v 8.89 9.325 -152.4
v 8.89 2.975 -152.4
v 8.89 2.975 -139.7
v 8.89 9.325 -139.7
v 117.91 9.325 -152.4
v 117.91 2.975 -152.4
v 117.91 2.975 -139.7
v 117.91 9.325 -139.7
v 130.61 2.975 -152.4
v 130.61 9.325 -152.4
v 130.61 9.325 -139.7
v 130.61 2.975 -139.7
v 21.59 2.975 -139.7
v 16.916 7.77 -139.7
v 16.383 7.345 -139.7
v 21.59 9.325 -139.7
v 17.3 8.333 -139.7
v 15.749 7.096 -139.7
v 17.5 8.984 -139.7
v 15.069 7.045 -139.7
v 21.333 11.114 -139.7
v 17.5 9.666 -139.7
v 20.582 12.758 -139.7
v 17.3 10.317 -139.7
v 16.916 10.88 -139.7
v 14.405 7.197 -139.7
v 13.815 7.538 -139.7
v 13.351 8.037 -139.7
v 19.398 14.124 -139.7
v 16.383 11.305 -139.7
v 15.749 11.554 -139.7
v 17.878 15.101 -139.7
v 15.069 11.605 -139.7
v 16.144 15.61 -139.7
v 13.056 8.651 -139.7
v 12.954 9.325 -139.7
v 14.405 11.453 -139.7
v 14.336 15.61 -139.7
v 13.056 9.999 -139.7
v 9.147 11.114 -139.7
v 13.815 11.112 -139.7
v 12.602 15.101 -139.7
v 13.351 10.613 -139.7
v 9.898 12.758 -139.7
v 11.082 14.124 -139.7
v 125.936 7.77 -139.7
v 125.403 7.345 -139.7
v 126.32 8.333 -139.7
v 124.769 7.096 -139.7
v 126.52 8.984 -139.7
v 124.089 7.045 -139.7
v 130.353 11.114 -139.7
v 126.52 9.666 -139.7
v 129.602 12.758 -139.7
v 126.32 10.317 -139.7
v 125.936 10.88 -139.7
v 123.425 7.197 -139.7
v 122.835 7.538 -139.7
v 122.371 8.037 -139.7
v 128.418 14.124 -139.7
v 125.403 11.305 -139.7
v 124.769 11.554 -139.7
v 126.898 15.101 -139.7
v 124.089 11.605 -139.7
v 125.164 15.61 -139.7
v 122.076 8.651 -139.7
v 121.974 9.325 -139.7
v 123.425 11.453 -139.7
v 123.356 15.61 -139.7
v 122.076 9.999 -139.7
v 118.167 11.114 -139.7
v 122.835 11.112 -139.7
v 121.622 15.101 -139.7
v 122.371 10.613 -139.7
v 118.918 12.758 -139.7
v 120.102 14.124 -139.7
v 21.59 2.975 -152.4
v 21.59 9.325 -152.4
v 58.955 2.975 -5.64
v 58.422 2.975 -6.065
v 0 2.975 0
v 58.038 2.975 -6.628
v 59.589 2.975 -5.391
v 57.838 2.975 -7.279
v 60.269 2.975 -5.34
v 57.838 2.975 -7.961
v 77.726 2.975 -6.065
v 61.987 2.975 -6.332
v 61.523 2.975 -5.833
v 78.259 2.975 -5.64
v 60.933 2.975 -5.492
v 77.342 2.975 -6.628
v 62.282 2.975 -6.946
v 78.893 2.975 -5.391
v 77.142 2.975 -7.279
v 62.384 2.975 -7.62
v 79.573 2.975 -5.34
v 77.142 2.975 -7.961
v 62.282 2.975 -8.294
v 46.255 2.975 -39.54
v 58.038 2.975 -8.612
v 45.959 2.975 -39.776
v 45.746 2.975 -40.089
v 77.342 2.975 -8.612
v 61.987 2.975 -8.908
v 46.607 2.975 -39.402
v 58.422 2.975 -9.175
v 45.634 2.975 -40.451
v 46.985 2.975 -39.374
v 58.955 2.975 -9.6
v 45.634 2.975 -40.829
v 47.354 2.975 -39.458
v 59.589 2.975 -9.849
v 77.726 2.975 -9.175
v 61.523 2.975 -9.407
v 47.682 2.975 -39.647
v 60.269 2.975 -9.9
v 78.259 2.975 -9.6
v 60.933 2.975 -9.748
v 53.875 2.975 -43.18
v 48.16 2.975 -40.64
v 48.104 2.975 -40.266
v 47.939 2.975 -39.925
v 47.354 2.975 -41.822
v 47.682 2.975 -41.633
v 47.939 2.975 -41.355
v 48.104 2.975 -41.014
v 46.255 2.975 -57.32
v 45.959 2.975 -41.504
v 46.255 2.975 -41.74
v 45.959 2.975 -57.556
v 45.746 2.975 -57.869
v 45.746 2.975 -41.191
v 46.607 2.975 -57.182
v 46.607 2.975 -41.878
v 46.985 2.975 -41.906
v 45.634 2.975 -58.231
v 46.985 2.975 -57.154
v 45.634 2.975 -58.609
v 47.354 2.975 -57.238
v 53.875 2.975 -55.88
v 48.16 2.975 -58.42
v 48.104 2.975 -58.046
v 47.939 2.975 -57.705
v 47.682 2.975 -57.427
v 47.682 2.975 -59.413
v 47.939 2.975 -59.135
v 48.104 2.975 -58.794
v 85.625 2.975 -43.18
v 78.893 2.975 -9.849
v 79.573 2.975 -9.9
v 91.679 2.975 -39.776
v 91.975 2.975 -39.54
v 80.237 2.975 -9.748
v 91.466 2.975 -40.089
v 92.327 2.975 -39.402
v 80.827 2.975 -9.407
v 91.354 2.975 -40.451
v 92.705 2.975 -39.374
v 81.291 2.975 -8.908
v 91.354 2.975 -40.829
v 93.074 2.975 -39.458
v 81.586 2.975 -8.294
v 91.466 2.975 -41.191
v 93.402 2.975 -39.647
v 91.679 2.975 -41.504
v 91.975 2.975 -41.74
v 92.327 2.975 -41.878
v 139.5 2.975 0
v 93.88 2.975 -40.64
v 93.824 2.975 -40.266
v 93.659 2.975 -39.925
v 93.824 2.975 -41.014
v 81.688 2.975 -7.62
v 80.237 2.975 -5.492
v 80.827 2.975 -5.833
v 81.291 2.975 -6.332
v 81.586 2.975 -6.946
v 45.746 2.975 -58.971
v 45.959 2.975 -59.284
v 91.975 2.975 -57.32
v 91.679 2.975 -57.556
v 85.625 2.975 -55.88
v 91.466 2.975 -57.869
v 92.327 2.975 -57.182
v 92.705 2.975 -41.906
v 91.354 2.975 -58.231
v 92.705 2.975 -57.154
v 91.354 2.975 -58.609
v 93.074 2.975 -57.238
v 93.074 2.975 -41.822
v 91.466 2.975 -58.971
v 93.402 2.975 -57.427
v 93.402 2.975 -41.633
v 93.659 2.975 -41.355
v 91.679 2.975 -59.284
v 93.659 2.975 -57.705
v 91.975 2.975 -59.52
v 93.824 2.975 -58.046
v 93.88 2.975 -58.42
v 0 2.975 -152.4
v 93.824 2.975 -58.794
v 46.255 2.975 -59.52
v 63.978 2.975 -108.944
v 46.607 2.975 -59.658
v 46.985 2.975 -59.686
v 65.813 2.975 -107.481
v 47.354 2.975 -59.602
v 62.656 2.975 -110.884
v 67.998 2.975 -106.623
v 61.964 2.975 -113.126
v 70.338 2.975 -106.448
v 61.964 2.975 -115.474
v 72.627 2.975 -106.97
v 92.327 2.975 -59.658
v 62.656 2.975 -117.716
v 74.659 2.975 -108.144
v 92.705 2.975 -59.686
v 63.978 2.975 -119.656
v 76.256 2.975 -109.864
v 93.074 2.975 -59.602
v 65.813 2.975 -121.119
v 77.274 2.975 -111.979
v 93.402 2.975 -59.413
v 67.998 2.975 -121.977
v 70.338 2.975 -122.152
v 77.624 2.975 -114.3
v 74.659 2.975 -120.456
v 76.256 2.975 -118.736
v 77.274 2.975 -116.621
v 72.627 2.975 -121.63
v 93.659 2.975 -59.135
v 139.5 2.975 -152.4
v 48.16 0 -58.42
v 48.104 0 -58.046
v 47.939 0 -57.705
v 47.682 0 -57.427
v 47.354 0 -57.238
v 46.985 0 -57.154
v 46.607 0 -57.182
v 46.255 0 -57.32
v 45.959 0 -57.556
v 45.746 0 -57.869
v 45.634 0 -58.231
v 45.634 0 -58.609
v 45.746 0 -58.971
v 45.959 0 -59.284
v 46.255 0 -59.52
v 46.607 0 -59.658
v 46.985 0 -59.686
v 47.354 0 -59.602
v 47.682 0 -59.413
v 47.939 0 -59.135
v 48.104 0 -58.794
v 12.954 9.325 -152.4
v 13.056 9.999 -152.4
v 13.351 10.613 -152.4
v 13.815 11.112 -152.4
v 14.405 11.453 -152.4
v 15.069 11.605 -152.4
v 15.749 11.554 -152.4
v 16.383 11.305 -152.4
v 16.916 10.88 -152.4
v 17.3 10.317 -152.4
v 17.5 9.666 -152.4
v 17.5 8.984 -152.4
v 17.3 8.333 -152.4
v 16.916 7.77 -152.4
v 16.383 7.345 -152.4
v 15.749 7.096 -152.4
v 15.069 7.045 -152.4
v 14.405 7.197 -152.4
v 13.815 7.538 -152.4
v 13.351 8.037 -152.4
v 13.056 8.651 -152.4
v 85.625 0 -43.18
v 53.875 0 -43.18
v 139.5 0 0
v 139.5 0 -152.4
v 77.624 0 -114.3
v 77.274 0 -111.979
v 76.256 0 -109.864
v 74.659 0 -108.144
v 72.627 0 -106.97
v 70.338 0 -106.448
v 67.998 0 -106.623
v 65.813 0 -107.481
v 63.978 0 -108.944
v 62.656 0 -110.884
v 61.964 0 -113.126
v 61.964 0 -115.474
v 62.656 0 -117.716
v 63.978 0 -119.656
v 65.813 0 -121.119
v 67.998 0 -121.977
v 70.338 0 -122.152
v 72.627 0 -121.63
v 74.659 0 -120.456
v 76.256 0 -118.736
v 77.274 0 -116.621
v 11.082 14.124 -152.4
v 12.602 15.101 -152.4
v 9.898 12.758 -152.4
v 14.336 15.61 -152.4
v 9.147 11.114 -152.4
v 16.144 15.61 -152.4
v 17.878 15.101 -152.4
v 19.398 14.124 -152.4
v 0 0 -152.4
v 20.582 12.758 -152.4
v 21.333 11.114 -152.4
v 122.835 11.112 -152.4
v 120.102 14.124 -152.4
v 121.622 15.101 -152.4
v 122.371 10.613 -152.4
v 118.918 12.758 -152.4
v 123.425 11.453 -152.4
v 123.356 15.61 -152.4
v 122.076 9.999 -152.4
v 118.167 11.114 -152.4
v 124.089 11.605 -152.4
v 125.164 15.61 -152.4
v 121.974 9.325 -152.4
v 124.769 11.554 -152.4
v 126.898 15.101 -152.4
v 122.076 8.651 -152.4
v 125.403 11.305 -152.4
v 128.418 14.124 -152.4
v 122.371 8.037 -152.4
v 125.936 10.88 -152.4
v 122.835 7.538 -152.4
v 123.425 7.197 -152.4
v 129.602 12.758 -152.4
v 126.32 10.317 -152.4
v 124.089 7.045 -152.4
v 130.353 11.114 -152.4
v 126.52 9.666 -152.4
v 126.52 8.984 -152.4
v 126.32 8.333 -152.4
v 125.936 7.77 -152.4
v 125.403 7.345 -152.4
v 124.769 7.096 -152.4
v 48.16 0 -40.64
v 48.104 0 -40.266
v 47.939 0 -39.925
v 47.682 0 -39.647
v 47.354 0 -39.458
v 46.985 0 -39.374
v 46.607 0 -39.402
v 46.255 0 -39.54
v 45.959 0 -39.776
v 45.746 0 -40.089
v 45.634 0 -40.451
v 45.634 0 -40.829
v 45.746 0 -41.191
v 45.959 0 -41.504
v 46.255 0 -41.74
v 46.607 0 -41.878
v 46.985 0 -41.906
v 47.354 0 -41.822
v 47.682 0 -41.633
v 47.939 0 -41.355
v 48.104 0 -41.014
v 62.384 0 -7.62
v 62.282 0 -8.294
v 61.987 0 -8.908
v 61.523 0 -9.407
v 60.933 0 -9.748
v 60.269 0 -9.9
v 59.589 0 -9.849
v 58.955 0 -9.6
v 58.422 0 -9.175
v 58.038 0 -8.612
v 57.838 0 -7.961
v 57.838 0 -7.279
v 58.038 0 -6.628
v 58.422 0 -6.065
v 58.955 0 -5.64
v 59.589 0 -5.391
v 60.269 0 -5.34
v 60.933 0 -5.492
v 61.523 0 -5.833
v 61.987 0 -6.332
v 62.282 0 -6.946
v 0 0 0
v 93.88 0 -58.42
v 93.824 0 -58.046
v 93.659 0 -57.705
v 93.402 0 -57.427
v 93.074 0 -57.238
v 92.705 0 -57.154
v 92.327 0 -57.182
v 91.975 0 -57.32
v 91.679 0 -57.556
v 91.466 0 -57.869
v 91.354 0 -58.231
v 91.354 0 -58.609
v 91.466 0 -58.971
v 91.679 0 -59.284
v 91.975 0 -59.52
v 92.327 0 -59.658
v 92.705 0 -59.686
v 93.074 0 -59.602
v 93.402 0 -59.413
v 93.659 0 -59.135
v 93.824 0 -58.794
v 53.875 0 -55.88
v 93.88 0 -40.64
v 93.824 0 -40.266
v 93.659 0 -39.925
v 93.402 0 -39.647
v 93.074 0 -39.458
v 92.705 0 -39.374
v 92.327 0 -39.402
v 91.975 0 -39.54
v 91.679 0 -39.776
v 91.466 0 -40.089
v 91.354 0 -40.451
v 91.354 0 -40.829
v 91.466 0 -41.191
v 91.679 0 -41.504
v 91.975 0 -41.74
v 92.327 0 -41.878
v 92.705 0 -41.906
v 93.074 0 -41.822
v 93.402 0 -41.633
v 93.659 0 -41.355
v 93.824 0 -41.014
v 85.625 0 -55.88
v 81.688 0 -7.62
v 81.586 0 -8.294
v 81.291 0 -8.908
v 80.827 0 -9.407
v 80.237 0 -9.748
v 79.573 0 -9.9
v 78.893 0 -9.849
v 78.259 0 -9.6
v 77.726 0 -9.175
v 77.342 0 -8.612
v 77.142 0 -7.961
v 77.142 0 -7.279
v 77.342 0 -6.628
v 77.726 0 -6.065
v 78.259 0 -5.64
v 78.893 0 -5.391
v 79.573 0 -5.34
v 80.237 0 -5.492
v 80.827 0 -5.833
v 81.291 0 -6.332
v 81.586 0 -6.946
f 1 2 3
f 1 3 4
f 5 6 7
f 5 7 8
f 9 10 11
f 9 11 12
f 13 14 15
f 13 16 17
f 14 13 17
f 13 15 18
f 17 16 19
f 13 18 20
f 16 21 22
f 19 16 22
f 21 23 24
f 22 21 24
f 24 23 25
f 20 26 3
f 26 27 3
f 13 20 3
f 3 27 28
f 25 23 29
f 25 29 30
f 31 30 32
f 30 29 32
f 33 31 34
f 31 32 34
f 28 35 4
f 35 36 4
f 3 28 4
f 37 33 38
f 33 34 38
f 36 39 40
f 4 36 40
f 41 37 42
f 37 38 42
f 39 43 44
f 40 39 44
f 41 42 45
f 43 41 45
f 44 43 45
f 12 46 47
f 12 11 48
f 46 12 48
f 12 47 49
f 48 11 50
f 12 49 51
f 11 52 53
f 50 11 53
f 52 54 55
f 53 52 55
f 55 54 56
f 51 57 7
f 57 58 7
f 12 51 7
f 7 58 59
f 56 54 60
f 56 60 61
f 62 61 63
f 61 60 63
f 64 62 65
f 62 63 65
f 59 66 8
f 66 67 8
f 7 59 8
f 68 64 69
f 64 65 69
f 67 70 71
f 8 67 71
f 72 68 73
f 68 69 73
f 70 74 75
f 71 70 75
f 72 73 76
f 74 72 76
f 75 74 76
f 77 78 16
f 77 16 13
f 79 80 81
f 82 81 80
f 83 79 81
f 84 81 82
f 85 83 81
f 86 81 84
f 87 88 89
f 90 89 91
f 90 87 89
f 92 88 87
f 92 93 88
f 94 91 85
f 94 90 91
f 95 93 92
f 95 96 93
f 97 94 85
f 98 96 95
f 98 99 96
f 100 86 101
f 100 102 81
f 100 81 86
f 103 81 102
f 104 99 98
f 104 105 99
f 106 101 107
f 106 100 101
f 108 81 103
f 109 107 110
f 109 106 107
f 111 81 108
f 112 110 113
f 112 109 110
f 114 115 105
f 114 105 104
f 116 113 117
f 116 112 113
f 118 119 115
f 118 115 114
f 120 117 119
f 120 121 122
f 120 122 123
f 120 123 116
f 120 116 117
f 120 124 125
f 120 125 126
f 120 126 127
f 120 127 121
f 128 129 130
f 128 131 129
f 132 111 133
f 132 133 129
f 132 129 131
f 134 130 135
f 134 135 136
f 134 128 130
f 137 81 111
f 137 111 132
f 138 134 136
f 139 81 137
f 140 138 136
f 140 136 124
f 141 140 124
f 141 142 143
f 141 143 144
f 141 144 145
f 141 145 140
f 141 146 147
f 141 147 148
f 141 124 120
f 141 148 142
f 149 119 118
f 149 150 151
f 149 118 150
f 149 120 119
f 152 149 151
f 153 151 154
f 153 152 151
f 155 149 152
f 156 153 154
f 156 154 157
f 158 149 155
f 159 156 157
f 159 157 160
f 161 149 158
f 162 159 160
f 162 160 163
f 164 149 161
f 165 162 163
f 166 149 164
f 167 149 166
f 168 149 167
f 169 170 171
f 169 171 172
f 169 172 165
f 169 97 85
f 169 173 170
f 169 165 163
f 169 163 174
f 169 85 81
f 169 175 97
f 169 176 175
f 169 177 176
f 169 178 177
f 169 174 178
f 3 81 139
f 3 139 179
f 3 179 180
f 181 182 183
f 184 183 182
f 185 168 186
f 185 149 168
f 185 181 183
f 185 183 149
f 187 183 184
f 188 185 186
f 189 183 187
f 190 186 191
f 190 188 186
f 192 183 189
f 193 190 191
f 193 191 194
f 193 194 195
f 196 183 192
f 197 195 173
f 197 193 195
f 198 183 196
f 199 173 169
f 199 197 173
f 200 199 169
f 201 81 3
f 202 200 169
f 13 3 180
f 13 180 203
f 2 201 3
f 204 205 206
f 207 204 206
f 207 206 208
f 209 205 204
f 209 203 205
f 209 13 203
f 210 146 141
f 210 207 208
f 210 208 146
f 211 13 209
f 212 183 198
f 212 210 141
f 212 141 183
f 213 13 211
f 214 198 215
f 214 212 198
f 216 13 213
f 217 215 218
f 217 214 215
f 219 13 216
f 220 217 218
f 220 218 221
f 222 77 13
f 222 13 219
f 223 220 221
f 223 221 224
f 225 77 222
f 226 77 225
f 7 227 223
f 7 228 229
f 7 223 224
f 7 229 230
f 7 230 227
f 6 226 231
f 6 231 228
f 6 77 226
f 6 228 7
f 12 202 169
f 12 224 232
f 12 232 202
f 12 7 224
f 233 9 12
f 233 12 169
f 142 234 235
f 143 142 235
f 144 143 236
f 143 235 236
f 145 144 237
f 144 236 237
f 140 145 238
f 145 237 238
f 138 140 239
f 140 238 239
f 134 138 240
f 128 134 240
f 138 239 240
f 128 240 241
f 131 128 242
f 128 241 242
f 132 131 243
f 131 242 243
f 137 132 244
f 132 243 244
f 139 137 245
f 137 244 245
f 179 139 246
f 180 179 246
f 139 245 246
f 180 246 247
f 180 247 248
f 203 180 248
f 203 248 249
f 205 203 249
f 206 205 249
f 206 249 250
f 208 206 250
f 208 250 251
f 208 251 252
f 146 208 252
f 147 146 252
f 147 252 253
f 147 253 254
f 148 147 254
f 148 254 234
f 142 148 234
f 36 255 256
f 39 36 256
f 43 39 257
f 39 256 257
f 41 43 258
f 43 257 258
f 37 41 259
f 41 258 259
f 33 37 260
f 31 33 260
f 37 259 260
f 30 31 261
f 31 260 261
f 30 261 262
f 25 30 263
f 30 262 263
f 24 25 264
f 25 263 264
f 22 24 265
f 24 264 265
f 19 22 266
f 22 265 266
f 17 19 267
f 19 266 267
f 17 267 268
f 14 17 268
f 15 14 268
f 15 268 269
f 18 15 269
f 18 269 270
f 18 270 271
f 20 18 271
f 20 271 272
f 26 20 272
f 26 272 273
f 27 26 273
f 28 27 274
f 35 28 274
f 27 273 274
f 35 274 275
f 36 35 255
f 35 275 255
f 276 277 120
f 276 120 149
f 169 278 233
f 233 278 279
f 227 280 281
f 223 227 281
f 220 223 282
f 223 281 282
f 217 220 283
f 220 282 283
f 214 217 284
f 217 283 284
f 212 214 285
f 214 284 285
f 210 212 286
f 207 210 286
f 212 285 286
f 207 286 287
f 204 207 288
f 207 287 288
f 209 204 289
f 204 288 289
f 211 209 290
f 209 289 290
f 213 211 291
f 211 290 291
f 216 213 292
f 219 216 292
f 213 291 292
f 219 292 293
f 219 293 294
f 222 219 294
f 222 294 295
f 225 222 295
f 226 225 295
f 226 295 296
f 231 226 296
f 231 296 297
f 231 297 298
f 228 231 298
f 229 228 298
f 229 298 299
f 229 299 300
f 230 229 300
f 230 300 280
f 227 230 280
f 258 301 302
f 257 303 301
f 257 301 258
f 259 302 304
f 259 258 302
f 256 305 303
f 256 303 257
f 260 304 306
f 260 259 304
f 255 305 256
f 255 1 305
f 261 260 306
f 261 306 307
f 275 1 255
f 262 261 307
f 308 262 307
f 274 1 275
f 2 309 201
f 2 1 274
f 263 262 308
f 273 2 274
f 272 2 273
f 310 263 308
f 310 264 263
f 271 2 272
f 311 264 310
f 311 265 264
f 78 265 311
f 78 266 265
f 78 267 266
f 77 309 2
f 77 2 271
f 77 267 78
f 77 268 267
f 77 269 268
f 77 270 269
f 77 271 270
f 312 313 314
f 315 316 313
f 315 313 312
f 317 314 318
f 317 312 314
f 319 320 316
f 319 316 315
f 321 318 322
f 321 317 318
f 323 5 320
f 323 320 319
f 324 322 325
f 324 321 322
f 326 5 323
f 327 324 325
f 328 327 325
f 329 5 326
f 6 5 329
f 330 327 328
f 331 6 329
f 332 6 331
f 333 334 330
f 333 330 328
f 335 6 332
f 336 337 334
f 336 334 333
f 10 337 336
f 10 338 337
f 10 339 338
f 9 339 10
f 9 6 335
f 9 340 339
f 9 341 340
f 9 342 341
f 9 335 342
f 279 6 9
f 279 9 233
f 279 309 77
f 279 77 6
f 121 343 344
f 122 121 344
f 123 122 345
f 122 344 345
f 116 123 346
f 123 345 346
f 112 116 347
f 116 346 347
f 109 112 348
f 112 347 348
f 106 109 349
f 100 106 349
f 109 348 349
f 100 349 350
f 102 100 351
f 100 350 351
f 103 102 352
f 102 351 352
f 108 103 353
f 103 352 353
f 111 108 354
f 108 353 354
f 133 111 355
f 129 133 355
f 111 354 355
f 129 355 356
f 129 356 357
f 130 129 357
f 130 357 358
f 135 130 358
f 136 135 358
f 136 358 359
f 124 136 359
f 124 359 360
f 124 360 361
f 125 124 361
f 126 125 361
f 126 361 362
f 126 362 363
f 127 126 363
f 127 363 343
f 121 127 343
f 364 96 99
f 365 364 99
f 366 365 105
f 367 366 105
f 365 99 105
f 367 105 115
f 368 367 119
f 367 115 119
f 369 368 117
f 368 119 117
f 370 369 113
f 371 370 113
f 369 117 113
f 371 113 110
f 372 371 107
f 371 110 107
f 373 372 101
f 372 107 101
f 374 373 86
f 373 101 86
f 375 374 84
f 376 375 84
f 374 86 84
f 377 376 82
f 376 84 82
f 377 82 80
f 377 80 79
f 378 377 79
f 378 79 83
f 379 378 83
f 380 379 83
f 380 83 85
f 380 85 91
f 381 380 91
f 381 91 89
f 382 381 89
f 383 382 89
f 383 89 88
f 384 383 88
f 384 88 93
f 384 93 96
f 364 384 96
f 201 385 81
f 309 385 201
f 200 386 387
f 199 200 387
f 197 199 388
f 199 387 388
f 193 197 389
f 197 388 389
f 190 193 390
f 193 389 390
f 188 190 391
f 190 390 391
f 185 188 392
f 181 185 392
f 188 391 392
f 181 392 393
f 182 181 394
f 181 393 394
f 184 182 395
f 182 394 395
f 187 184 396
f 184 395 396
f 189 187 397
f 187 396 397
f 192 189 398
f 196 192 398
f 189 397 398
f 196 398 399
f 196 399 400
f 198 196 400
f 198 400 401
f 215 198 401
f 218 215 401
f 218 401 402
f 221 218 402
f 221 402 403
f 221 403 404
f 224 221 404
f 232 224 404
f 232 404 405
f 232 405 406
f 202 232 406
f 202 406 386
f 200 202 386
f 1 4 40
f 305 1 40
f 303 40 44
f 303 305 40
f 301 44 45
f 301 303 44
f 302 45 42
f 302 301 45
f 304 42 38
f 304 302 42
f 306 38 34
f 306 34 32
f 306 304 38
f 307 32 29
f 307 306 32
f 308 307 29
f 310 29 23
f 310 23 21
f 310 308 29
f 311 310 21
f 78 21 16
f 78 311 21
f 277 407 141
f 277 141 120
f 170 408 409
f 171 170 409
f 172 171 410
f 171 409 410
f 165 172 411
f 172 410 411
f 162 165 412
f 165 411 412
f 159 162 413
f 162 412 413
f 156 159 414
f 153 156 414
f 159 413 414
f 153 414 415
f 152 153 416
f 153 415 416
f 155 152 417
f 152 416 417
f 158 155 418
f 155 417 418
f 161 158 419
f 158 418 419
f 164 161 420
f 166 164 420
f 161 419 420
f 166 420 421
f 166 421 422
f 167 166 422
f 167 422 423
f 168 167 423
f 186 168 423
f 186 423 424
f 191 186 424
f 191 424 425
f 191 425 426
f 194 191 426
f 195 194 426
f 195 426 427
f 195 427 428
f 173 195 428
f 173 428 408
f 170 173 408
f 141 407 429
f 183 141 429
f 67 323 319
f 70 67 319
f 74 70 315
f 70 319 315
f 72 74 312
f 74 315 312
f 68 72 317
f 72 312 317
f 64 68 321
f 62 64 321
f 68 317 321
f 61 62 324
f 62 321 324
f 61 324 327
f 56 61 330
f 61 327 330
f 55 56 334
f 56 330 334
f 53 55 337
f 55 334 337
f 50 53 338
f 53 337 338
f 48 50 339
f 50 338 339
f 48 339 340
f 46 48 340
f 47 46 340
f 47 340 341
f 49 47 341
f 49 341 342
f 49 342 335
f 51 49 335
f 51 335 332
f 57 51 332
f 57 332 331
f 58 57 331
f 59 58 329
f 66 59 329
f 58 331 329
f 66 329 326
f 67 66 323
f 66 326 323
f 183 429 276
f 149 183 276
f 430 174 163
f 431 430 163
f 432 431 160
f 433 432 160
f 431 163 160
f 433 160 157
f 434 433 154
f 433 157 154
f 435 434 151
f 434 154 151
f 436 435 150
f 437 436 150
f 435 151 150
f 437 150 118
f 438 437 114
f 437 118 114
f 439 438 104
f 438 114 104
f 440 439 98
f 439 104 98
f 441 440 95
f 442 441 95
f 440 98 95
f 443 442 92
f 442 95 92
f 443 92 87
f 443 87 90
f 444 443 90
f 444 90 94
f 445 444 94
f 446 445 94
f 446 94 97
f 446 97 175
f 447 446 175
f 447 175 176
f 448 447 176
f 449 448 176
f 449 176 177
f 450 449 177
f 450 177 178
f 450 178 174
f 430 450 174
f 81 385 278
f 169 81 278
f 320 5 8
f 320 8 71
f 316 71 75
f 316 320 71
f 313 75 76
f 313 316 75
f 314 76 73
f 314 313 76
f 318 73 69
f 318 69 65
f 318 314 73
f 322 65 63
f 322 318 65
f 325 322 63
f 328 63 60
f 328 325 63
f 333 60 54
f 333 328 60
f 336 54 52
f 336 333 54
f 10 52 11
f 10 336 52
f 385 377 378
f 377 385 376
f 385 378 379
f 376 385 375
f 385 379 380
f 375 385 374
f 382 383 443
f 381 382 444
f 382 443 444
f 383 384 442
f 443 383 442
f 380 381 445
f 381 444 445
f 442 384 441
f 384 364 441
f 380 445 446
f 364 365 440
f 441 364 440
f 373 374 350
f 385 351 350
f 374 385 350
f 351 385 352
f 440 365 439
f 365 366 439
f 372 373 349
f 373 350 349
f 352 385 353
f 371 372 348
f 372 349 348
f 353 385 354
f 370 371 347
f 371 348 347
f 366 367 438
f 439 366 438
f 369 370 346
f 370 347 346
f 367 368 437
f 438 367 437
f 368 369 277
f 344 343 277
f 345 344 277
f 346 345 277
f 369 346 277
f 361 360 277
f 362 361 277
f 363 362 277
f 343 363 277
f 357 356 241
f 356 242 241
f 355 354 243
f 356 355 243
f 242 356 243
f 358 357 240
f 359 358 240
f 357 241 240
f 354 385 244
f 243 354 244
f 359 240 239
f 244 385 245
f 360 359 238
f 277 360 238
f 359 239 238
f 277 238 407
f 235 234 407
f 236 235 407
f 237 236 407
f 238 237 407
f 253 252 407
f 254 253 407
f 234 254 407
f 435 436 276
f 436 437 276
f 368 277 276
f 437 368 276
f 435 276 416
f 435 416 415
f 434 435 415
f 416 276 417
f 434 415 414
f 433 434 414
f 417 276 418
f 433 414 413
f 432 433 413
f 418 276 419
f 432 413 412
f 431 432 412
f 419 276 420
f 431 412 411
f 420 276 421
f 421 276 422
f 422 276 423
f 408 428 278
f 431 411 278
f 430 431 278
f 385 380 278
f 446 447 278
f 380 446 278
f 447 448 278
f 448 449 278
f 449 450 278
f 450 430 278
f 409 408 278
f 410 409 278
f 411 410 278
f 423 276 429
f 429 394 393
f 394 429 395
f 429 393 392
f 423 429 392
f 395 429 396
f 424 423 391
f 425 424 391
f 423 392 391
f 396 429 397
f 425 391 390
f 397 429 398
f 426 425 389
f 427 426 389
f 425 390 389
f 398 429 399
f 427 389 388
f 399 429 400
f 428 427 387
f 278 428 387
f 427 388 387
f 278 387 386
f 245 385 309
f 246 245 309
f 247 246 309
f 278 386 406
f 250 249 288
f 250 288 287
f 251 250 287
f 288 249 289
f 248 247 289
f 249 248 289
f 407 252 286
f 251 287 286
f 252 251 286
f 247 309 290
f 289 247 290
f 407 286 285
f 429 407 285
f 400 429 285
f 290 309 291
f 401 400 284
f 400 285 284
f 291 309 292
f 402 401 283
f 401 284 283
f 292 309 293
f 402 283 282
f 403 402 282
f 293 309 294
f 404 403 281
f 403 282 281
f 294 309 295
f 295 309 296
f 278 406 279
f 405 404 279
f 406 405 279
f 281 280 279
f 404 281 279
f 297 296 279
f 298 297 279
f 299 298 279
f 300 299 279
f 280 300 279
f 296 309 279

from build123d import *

# Parameters (mm, degrees)
SKETCH1_W               = 139.5
SKETCH1_H               = 152.4
BOSS_EXTRUDE1_DEPTH     = 6.35
SKETCH2_W               = 139.5
SKETCH2_H               = 152.4
CUT_EXTRUDE1_DEPTH      = 3.375
SKETCH4_R               = 2.286
BOSS_EXTRUDE3_DEPTH     = 12.7
SKETCH5_R               = 7.874
CUT_EXTRUDE2_DEPTH      = 16.675
SKETCH6_R               = 2.286
CUT_EXTRUDE3_DEPTH      = 3.975
SKETCH7_R               = 1.27
SKETCH7_W               = 31.75
SKETCH7_H               = 12.7
CUT_EXTRUDE4_DEPTH      = 1
CUT_EXTRUDE4_DEPTH_BACK = 16.675


with BuildPart() as part:
    # Sketch1 → Boss-Extrude1 (new body)
    with BuildSketch(Plane(origin=(0, 0, 0), x_dir=(1, 0, 0), z_dir=(0, 1, 0))):
        with Locations((69.75, 76.2)):
            Rectangle(SKETCH1_W, SKETCH1_H)
    extrude(amount=BOSS_EXTRUDE1_DEPTH)

    # Sketch2 → Cut-Extrude1 (cut)
    with BuildSketch(Plane(origin=(0, 6.35, 0), x_dir=(1, 0, 0), z_dir=(0, 1, 0))):
        with Locations((69.75, 76.2)):
            Rectangle(SKETCH2_W, SKETCH2_H)
    extrude(amount=-CUT_EXTRUDE1_DEPTH, mode=Mode.SUBTRACT)

    # Sketch4 → Boss-Extrude3 (add)
    with BuildSketch(Plane(origin=(0, 0, -152.4), x_dir=(-1, 0, 0), z_dir=(0, 0, -1))):
        with BuildLine():
            Line((-130.61, 9.325), (-130.61, 2.975))
            Line((-130.61, 2.975), (-117.91, 2.975))
            Line((-117.91, 2.975), (-117.91, 9.325))
            ThreePointArc((-117.91, 9.325), (-124.26, 15.675), (-130.61, 9.325))
        make_face()
        with Locations((-124.26, 9.325)):
            Circle(SKETCH4_R, mode=Mode.SUBTRACT)
        with BuildLine():
            Line((-21.59, 9.325), (-21.59, 2.975))
            Line((-21.59, 2.975), (-8.89, 2.975))
            Line((-8.89, 2.975), (-8.89, 9.325))
            ThreePointArc((-8.89, 9.325), (-15.24, 15.675), (-21.59, 9.325))
        make_face()
        with Locations((-15.24, 9.325)):
            Circle(SKETCH4_R, mode=Mode.SUBTRACT)
    extrude(amount=-BOSS_EXTRUDE3_DEPTH)

    # Sketch5 → Cut-Extrude2 (cut, through all)
    with BuildSketch(Plane.XZ):
        with Locations((69.75, -114.3)):
            Circle(SKETCH5_R)
    extrude(amount=-CUT_EXTRUDE2_DEPTH, mode=Mode.SUBTRACT)

    # Sketch6 → Cut-Extrude3 (cut, through all)
    with BuildSketch(Plane(origin=(0, 2.975, 0), x_dir=(1, 0, 0), z_dir=(0, 1, 0))):
        with Locations((60.098, 7.62)):
            Circle(SKETCH6_R)
        with Locations((79.402, 7.62)):
            Circle(SKETCH6_R)
    extrude(amount=-CUT_EXTRUDE3_DEPTH, mode=Mode.SUBTRACT)

    # Sketch7 → Cut-Extrude4 (cut, two sides)
    with BuildSketch(Plane.XZ) as cut_extrude4_sk:
        with Locations((46.89, -40.64)):
            Circle(SKETCH7_R)
        with Locations((92.61, -40.64)):
            Circle(SKETCH7_R)
        with Locations((92.61, -58.42)):
            Circle(SKETCH7_R)
        with Locations((46.89, -58.42)):
            Circle(SKETCH7_R)
        with Locations((69.75, -49.53)):
            Rectangle(SKETCH7_W, SKETCH7_H)
    extrude(amount=CUT_EXTRUDE4_DEPTH, mode=Mode.SUBTRACT)
    extrude(cut_extrude4_sk.sketch, amount=-CUT_EXTRUDE4_DEPTH_BACK, mode=Mode.SUBTRACT)


solid = part.part
